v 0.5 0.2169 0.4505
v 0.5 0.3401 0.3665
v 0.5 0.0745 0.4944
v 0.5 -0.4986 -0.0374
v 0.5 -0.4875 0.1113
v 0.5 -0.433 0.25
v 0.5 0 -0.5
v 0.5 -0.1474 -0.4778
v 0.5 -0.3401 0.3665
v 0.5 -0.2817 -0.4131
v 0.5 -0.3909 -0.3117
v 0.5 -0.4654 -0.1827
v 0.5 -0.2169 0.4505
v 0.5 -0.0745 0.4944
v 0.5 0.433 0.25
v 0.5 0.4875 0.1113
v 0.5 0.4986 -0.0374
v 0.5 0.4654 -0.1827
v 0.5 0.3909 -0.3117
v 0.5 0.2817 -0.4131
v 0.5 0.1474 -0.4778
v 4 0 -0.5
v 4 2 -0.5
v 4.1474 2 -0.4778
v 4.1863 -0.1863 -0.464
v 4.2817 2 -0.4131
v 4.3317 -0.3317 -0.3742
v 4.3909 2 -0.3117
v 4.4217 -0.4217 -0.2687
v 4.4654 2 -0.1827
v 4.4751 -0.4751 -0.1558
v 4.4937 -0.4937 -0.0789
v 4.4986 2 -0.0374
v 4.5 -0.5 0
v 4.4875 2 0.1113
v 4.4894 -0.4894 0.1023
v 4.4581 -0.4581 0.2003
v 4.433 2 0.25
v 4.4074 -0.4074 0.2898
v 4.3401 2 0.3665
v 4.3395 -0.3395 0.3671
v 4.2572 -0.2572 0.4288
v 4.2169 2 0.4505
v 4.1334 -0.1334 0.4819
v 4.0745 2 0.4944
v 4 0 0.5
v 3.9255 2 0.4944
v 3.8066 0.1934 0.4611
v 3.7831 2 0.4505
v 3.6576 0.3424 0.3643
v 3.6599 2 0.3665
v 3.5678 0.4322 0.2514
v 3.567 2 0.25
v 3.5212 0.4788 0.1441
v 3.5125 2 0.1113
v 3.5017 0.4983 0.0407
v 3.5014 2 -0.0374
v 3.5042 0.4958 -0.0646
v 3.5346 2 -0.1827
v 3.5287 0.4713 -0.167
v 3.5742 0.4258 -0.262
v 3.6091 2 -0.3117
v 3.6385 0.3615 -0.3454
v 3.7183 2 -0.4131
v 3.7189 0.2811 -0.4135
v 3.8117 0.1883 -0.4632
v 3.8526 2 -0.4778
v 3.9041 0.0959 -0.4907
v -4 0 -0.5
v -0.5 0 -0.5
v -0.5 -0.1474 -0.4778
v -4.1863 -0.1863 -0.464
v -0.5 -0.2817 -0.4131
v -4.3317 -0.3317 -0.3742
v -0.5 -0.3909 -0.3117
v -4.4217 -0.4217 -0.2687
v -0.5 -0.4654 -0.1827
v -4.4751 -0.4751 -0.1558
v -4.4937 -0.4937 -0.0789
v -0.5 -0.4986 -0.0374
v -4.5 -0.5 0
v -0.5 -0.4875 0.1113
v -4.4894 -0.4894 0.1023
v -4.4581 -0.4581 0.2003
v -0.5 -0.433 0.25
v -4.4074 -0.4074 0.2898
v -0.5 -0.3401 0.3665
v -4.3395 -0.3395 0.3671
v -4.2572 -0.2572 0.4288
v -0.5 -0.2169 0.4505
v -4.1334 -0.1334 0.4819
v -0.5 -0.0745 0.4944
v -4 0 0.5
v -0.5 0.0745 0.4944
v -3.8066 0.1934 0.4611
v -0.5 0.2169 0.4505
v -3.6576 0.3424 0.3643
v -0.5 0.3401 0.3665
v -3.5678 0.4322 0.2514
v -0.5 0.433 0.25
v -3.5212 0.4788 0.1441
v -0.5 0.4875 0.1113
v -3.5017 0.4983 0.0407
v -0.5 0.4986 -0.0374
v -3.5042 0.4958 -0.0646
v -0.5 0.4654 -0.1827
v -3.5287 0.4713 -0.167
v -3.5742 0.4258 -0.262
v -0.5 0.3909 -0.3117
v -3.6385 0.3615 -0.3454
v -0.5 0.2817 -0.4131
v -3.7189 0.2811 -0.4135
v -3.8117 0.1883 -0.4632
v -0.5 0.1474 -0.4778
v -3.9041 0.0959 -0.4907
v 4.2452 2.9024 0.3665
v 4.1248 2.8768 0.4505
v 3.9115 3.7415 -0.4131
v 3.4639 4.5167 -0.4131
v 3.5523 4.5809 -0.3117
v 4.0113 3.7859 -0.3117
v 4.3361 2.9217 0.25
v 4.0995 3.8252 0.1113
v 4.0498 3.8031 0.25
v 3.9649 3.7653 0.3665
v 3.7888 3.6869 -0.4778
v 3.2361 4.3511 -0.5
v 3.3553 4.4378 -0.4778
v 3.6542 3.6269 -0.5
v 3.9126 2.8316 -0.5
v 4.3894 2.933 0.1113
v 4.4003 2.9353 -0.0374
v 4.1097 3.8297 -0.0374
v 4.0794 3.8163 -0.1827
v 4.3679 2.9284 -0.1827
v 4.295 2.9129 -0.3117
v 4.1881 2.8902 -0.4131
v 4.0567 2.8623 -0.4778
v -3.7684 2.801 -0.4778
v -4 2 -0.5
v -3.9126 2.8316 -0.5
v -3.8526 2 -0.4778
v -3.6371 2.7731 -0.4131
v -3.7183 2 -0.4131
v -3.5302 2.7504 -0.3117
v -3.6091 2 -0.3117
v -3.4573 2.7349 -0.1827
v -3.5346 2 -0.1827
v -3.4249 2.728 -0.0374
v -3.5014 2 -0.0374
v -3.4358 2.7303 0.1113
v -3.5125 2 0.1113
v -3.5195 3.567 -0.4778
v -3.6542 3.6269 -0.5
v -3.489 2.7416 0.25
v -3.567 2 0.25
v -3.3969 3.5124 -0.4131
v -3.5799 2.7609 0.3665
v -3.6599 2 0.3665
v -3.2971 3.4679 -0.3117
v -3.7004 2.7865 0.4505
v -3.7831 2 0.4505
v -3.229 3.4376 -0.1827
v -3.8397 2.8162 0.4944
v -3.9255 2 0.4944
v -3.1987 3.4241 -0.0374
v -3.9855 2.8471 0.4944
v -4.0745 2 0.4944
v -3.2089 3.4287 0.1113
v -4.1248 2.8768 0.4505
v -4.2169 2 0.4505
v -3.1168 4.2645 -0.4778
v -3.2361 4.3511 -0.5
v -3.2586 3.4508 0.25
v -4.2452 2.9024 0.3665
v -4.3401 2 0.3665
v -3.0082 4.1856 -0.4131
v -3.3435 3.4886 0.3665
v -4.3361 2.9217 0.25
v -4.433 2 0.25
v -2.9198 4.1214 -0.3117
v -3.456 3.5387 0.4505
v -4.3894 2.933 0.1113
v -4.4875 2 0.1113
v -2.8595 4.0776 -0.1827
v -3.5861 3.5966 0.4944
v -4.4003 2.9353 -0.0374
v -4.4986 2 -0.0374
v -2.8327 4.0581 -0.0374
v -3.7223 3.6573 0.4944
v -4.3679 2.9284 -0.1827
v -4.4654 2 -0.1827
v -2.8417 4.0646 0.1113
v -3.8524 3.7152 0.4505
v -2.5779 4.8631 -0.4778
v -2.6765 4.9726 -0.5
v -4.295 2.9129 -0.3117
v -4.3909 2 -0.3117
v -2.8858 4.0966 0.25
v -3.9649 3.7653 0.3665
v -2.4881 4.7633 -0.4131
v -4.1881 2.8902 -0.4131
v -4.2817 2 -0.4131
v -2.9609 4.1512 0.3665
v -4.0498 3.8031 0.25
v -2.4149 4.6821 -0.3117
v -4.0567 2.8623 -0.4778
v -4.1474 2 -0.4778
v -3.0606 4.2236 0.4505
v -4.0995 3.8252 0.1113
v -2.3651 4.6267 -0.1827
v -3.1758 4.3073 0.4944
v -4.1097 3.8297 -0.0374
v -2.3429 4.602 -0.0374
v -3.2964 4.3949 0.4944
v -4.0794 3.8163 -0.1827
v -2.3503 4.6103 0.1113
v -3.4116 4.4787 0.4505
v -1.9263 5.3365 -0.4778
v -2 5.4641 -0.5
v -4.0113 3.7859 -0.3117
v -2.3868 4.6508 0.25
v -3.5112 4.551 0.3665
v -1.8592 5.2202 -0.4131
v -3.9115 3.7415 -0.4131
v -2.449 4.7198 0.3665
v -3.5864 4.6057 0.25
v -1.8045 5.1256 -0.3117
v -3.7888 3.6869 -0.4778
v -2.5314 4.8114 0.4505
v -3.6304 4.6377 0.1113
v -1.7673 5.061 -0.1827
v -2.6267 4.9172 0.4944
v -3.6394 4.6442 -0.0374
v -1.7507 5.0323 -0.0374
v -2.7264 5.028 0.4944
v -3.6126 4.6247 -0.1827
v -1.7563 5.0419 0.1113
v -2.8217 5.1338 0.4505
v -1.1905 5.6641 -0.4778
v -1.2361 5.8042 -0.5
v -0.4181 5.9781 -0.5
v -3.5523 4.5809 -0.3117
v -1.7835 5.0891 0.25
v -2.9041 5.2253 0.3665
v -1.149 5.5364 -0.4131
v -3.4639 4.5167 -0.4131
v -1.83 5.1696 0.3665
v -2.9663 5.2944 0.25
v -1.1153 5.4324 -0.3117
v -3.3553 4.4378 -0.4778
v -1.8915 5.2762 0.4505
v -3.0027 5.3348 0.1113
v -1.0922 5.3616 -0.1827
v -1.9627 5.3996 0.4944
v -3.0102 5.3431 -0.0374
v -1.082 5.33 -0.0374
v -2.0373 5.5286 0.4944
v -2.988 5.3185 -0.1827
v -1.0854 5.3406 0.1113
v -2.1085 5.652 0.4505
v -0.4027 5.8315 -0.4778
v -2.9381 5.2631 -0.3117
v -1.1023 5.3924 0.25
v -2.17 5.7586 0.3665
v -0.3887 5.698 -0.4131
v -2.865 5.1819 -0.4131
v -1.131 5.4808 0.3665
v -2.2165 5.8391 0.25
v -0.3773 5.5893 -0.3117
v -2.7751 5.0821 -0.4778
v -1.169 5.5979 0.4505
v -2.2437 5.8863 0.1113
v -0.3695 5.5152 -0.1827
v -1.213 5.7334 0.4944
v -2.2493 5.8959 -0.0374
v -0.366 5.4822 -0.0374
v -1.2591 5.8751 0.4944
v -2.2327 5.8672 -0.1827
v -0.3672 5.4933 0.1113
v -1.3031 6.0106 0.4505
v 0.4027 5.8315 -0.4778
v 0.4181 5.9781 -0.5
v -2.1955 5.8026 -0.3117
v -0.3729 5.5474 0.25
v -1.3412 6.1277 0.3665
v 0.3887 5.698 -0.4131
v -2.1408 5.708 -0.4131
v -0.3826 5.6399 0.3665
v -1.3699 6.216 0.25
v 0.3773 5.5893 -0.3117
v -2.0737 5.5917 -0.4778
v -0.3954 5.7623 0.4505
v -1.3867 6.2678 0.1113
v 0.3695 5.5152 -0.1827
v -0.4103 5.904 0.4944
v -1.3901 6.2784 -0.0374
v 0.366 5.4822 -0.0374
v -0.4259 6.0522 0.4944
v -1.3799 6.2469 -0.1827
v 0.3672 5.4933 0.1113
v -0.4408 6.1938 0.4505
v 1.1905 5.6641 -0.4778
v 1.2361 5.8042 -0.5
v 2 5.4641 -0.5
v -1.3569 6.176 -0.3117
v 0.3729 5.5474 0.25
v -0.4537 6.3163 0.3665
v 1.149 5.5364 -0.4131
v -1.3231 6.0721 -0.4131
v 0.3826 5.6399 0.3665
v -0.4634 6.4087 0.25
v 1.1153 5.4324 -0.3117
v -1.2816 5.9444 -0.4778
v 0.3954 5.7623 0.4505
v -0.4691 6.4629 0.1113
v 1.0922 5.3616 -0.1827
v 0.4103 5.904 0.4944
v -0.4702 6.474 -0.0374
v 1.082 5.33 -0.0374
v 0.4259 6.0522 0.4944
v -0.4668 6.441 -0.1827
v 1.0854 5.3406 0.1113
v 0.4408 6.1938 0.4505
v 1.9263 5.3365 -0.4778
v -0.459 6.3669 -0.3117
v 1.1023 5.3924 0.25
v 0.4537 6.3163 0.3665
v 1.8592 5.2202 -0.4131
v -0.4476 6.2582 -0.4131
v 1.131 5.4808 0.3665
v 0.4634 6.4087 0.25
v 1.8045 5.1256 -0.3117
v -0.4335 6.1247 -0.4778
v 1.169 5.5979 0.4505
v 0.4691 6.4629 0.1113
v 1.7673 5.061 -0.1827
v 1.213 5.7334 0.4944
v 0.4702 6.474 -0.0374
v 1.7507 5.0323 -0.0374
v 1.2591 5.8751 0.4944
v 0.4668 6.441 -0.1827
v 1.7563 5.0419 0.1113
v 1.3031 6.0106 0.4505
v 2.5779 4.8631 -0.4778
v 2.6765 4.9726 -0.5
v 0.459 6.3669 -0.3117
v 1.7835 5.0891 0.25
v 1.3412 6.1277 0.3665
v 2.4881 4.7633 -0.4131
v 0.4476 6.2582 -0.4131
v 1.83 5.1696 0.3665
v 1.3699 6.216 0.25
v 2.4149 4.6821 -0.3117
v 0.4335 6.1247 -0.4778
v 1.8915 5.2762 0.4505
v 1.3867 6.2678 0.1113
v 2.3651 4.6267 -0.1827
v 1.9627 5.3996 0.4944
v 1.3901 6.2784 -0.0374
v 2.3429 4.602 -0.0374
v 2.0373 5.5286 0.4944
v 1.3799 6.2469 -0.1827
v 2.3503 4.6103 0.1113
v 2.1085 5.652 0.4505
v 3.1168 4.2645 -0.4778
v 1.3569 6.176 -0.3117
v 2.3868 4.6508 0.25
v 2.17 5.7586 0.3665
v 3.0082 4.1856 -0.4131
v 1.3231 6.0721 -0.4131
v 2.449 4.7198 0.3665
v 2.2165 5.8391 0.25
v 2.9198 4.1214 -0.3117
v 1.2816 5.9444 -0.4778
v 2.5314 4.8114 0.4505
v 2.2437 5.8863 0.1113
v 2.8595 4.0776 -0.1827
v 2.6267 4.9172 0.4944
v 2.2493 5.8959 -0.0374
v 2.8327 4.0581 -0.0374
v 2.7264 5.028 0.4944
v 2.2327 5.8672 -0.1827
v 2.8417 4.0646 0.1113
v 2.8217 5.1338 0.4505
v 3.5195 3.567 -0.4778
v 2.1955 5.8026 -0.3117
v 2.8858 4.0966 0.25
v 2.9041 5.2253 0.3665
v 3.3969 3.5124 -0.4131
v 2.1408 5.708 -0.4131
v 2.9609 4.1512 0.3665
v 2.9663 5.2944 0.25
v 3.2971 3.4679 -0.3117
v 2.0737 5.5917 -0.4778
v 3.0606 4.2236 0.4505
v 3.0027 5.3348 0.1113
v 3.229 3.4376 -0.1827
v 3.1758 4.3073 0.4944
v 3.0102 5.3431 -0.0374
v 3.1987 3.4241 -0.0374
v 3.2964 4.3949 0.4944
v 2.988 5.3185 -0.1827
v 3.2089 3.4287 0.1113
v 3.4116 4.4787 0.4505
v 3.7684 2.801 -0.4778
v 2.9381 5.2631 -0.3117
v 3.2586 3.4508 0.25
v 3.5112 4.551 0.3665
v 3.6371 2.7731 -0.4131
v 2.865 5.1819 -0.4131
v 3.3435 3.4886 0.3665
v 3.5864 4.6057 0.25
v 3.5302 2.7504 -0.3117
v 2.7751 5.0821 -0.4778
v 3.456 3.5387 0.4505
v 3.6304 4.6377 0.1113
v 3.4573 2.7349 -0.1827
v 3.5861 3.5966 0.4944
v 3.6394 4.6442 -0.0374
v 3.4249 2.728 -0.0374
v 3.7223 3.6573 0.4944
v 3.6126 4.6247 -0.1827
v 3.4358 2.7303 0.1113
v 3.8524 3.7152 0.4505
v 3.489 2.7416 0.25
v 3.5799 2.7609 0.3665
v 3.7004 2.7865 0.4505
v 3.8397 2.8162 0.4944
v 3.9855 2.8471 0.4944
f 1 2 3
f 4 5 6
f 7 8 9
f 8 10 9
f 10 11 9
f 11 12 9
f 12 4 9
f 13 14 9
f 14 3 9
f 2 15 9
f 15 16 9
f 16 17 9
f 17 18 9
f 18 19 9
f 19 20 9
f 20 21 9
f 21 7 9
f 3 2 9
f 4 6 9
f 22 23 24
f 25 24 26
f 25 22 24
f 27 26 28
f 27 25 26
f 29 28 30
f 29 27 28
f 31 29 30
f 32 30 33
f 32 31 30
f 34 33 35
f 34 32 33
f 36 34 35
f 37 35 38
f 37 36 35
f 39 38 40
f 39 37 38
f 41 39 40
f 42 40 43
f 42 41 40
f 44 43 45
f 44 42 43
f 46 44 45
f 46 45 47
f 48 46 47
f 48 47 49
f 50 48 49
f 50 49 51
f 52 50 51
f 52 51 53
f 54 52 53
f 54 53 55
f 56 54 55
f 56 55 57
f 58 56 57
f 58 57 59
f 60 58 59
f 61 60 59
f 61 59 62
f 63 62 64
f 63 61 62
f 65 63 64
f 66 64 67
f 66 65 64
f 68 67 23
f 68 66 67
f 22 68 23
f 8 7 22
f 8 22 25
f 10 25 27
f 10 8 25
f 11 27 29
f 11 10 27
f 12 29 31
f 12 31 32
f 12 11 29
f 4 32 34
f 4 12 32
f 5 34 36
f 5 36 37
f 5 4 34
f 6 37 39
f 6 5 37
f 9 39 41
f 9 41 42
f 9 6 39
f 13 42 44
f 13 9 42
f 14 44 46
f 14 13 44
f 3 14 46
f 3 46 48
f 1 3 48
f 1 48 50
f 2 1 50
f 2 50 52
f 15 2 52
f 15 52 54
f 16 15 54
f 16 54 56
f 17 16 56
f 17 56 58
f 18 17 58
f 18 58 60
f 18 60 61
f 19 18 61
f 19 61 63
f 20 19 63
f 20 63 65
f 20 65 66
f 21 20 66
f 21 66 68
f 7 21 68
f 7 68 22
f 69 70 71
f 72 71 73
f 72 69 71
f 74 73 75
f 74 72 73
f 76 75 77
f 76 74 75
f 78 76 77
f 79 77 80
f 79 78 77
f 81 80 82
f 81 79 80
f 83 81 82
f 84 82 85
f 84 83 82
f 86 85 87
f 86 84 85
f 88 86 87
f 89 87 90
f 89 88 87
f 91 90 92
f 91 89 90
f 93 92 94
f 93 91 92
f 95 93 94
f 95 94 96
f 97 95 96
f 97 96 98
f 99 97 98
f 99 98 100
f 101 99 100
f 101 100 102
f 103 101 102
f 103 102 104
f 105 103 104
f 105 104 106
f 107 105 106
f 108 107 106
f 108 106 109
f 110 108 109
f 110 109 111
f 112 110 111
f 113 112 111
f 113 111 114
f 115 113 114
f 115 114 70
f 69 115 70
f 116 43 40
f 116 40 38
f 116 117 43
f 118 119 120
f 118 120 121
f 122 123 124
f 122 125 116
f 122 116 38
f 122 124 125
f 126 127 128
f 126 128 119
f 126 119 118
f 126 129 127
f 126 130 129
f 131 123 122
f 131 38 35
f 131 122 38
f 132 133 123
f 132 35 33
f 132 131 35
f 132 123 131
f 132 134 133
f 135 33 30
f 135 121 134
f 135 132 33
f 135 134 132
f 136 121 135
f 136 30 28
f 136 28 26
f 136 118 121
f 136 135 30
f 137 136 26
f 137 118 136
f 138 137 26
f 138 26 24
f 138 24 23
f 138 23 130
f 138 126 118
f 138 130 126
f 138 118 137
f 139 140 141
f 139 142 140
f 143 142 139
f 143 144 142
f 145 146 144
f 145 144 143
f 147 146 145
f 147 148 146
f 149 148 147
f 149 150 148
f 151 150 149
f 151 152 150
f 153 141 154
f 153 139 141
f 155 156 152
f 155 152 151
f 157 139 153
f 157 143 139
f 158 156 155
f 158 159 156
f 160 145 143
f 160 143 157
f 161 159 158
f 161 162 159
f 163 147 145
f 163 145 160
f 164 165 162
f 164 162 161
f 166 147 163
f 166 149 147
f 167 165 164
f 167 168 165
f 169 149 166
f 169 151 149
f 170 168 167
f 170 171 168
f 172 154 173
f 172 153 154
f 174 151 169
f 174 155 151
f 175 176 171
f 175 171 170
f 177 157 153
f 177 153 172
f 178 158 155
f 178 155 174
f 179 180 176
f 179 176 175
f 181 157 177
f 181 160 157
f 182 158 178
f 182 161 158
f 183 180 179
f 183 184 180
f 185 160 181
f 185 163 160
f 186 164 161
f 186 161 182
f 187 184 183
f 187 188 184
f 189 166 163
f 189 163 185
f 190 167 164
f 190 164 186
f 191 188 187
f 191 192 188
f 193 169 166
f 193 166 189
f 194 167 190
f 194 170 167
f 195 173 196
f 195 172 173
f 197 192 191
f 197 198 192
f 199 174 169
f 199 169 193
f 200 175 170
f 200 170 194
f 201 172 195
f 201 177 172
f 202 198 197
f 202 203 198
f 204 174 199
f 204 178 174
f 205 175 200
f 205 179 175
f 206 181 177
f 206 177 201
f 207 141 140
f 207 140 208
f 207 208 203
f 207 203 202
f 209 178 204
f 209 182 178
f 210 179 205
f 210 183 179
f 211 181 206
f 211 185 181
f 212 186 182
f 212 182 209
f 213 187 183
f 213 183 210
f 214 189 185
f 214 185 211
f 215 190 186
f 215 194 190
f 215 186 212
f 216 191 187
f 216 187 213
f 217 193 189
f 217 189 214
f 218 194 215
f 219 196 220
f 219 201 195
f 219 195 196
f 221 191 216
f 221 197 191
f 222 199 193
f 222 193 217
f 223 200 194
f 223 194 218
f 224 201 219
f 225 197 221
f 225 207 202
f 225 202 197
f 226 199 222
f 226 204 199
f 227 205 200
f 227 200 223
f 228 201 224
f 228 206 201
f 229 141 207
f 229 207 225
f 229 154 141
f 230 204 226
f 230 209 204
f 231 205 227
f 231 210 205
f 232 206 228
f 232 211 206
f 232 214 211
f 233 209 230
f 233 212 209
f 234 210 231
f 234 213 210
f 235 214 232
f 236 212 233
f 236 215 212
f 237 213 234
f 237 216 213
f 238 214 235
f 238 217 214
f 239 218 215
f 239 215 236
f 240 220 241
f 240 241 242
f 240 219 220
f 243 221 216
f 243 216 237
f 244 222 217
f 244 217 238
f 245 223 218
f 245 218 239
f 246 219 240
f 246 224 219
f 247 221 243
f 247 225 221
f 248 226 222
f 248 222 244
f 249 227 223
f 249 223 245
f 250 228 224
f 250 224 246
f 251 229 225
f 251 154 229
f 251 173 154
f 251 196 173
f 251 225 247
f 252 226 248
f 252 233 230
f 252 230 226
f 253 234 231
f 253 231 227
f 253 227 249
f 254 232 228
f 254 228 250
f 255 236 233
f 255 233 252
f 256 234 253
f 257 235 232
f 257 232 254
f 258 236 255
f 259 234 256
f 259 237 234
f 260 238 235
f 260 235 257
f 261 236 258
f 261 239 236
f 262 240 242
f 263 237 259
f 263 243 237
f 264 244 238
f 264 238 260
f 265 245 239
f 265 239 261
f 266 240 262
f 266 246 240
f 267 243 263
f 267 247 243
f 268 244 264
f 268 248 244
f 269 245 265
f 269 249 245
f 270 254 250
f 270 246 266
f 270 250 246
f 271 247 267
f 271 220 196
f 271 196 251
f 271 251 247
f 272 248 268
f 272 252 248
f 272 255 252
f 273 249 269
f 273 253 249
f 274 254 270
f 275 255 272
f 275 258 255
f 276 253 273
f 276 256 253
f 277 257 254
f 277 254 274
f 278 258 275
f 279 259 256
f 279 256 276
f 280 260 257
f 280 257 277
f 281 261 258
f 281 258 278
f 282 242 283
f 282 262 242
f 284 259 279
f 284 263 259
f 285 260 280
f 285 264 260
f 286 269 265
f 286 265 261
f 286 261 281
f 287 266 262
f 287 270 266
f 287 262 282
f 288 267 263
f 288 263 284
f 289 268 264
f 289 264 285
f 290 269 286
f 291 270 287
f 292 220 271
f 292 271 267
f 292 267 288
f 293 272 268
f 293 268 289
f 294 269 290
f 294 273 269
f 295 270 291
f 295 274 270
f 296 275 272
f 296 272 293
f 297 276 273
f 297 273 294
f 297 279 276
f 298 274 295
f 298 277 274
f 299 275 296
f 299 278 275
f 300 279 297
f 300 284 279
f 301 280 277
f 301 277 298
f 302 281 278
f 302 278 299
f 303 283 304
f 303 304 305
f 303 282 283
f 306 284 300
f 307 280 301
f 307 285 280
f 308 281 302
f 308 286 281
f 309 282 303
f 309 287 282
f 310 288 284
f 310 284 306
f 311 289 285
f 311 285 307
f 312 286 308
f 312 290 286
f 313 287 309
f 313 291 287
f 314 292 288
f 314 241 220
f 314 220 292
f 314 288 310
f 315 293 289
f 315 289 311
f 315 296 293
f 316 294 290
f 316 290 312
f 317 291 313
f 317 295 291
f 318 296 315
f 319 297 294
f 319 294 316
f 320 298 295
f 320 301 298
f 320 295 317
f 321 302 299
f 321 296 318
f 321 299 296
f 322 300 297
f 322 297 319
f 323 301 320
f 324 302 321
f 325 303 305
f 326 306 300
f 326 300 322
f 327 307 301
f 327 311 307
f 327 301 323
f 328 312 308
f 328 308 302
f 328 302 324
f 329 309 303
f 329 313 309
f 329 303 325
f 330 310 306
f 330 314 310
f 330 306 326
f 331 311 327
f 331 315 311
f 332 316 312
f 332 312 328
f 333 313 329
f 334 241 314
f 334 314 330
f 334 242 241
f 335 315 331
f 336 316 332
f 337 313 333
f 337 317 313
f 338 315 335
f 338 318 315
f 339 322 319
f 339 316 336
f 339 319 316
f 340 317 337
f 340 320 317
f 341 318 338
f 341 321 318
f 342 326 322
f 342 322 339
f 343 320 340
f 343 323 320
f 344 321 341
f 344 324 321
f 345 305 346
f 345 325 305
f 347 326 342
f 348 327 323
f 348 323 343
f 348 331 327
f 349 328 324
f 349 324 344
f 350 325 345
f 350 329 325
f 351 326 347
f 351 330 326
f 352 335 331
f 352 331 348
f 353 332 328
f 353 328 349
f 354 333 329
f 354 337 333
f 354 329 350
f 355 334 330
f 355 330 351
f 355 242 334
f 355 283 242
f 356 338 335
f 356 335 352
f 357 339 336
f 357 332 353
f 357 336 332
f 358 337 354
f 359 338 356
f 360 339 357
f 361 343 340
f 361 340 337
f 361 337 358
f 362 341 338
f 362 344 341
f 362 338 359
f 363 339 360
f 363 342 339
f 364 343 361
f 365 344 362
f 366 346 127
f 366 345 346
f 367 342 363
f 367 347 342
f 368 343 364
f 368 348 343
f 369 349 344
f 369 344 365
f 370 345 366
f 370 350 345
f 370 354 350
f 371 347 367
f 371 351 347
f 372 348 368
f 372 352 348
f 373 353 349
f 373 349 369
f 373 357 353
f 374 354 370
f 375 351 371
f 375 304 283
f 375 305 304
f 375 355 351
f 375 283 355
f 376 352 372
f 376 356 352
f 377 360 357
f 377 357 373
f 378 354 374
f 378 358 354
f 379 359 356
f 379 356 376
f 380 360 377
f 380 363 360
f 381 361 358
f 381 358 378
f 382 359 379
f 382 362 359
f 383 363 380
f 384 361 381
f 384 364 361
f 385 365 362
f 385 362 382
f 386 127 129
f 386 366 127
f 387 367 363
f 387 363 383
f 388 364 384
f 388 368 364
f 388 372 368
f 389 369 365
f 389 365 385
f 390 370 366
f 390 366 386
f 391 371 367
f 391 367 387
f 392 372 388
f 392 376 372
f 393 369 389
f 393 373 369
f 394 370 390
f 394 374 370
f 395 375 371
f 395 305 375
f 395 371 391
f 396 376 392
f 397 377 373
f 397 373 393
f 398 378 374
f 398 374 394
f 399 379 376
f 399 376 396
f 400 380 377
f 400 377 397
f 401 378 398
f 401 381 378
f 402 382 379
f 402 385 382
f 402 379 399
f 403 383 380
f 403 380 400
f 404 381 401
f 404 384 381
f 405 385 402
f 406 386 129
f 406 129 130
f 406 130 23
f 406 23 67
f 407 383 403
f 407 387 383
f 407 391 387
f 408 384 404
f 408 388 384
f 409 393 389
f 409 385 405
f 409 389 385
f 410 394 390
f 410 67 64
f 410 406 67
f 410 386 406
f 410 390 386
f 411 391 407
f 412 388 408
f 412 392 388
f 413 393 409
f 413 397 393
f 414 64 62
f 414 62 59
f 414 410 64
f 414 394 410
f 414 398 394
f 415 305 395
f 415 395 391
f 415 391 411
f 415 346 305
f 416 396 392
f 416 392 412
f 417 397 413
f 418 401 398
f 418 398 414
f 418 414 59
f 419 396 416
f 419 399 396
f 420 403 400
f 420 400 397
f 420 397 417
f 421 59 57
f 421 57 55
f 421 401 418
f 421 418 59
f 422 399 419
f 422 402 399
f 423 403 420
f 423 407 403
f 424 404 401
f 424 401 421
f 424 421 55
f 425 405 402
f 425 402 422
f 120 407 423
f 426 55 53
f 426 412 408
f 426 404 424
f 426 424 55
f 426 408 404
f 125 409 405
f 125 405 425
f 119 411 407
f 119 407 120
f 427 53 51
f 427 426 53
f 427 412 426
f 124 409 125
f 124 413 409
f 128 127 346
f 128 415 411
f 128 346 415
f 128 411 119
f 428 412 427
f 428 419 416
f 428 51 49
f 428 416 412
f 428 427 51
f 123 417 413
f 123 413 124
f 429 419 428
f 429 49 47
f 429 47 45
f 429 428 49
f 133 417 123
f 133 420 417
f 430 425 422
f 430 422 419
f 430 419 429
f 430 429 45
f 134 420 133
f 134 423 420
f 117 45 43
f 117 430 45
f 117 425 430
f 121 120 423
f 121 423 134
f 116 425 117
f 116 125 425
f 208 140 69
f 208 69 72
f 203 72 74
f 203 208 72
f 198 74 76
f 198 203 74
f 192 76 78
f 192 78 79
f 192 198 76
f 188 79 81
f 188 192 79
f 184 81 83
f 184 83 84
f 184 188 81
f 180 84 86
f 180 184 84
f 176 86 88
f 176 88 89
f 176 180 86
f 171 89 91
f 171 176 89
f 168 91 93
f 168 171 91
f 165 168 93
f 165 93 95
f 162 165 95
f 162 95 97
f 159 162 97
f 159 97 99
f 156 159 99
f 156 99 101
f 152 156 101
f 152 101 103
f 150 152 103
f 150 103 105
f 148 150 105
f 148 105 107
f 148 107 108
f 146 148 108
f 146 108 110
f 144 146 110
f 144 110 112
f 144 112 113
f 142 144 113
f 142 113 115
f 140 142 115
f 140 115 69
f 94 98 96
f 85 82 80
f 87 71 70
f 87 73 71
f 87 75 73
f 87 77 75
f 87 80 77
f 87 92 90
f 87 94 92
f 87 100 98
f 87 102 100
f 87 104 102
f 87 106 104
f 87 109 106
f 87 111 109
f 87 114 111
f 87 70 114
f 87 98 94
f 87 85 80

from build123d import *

# Parameters (mm, degrees)
SKETCH_2_R = 0.5


with BuildPart() as part:
    # 扫描1: sweep along a path in 草图1
    with BuildLine(Plane.XY) as sweep_1_path:
        Line((-0.5, 0), (-4, 0))
        Line((-4, 0), (-4, 2))
        ThreePointArc((-4, 2), (0, 6), (4, 2))
        Line((4, 2), (4, 0))
        Line((4, 0), (0.5, 0))
    # 草图2 → 扫描1 (sweep)
    with BuildSketch(Plane(origin=(-0.5, 0, 0), x_dir=(0, 0, -1), z_dir=(1, 0, 0))):
        Circle(SKETCH_2_R)
    sweep(path=sweep_1_path.line, transition=Transition.RIGHT)


solid = part.part
